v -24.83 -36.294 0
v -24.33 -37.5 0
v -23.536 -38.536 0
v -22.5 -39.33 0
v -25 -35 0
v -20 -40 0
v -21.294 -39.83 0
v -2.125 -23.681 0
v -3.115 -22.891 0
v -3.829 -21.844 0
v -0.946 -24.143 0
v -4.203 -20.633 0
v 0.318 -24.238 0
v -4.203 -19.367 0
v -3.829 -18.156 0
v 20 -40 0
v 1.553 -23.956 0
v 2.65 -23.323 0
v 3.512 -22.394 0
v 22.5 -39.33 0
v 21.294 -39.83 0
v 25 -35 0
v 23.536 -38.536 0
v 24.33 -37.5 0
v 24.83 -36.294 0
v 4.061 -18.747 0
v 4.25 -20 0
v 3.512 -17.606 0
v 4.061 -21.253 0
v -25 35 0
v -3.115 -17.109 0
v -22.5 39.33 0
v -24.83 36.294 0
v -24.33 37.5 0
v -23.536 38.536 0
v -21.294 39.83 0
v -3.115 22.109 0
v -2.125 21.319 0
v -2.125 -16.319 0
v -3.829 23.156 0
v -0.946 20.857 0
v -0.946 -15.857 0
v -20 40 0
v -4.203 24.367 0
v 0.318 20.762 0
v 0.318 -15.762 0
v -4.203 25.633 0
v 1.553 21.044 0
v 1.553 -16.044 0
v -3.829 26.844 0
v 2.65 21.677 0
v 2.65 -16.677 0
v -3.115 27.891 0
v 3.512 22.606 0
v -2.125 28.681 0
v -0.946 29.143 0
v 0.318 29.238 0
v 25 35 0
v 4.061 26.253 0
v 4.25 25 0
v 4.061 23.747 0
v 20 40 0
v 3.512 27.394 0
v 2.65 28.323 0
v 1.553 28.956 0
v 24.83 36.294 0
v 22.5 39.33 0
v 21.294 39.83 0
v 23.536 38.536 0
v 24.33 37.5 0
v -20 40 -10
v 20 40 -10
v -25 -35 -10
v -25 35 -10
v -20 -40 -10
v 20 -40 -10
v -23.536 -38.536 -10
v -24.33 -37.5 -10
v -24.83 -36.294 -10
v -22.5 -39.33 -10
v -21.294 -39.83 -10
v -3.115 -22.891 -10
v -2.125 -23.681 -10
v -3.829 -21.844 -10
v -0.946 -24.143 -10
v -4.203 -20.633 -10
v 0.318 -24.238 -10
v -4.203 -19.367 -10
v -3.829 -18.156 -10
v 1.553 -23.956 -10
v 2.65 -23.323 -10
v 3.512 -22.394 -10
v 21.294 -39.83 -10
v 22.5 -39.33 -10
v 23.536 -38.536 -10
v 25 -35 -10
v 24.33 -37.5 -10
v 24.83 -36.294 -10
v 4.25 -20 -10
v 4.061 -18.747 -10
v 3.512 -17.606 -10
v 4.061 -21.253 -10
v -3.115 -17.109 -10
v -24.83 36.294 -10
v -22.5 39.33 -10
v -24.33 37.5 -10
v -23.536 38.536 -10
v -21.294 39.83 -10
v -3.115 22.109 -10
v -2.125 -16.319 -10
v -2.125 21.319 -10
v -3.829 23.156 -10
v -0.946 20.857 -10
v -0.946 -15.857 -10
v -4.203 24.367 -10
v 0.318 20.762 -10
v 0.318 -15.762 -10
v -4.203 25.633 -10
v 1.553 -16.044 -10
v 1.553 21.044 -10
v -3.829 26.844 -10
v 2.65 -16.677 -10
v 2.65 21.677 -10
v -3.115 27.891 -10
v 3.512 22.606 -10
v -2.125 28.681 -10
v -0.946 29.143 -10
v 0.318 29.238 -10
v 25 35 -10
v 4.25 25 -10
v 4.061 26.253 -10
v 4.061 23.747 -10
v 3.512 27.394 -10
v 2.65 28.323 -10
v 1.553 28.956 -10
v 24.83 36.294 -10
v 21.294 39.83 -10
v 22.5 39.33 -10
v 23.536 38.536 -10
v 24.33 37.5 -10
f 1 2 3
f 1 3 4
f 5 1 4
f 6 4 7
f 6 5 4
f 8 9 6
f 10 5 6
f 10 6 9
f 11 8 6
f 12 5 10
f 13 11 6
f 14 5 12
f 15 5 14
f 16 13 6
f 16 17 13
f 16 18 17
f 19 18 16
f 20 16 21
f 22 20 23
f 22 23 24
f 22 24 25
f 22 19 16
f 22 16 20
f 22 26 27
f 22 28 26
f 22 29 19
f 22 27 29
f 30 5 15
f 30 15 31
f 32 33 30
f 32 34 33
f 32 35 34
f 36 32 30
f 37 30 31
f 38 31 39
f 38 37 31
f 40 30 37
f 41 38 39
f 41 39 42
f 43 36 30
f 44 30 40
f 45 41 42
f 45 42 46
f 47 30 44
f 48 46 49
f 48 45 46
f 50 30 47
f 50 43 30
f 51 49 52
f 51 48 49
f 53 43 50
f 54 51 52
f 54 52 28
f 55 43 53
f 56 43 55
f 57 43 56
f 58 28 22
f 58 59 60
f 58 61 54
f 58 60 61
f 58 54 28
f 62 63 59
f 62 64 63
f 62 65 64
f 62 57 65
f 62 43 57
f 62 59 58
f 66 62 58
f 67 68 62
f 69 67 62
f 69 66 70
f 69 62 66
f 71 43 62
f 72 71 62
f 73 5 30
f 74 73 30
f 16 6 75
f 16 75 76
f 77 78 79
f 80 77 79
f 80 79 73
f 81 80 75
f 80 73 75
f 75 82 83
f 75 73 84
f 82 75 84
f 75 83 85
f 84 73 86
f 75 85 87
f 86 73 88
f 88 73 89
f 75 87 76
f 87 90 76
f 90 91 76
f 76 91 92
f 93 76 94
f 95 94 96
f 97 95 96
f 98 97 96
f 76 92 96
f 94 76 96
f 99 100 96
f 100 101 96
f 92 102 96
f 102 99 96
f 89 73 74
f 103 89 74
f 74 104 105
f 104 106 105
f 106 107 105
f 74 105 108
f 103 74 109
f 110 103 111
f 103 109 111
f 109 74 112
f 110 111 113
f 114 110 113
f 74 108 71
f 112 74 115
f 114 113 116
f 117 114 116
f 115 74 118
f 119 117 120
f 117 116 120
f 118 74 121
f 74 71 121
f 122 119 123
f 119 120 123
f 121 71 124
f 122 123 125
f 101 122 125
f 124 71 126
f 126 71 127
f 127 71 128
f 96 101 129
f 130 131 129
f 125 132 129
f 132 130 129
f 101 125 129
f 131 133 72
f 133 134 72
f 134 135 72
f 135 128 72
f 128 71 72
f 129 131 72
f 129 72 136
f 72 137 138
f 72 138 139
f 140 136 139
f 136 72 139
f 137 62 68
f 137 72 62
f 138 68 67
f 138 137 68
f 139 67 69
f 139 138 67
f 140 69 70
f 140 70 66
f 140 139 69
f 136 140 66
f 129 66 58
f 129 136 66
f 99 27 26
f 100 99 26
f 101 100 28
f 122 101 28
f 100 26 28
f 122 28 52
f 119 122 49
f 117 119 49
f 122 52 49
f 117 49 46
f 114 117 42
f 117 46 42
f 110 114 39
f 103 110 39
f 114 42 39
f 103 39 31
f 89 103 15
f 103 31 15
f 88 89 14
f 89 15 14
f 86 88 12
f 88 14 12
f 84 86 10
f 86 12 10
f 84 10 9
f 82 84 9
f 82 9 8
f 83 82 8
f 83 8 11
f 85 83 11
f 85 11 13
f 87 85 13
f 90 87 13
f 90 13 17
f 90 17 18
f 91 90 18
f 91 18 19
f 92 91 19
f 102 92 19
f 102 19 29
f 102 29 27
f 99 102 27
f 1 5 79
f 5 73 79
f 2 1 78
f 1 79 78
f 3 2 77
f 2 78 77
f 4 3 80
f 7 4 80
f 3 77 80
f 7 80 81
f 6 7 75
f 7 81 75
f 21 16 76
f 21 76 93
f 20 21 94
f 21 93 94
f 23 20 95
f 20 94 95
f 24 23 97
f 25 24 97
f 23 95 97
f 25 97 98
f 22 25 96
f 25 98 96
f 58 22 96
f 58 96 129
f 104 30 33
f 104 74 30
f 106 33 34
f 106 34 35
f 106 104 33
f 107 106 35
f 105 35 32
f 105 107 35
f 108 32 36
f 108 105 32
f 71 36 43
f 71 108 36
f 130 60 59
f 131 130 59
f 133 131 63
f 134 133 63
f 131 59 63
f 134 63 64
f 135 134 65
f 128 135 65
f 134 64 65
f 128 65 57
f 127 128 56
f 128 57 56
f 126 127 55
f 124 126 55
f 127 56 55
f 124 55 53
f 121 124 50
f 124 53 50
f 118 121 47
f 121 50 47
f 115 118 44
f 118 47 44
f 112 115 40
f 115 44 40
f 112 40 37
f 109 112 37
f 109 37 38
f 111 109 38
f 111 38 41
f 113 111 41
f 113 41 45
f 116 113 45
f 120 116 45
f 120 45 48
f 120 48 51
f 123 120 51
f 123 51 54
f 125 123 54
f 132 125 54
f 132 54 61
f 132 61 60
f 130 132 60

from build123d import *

# Parameters (mm, degrees)
IZIM1_W               = 50
IZIM1_H               = 80
TABAN_FLAN_1_DEPTH    = 10
IZIM6_R               = 4.25
KES_EKSTR_ZYON1_DEPTH = 20
RADYUS1_R             = 5


# Sheet-metal steps are written as plain solids
with BuildPart() as part:
    # Çizim1 → Taban-Flanş1 (new body)
    with BuildSketch(Plane.XY):
        Rectangle(IZIM1_W, IZIM1_H)
    extrude(amount=-TABAN_FLAN_1_DEPTH)

    # Çizim6 → Kes-Ekstrüzyon1 (cut)
    with BuildSketch(Plane.XY):
        with Locations((0, 25)):
            Circle(IZIM6_R)
        with Locations((0, -20)):
            Circle(IZIM6_R)
    extrude(amount=-KES_EKSTR_ZYON1_DEPTH, mode=Mode.SUBTRACT)

    # Radyus1
    radyus1_edges = [part.edges().sort_by_distance(p)[0] for p in [
        (25, -40, -5),
        (-25, -40, -5),
        (-25, 40, -5),
        (25, 40, -5),
    ]]
    fillet(radyus1_edges, radius=RADYUS1_R)


solid = part.part
